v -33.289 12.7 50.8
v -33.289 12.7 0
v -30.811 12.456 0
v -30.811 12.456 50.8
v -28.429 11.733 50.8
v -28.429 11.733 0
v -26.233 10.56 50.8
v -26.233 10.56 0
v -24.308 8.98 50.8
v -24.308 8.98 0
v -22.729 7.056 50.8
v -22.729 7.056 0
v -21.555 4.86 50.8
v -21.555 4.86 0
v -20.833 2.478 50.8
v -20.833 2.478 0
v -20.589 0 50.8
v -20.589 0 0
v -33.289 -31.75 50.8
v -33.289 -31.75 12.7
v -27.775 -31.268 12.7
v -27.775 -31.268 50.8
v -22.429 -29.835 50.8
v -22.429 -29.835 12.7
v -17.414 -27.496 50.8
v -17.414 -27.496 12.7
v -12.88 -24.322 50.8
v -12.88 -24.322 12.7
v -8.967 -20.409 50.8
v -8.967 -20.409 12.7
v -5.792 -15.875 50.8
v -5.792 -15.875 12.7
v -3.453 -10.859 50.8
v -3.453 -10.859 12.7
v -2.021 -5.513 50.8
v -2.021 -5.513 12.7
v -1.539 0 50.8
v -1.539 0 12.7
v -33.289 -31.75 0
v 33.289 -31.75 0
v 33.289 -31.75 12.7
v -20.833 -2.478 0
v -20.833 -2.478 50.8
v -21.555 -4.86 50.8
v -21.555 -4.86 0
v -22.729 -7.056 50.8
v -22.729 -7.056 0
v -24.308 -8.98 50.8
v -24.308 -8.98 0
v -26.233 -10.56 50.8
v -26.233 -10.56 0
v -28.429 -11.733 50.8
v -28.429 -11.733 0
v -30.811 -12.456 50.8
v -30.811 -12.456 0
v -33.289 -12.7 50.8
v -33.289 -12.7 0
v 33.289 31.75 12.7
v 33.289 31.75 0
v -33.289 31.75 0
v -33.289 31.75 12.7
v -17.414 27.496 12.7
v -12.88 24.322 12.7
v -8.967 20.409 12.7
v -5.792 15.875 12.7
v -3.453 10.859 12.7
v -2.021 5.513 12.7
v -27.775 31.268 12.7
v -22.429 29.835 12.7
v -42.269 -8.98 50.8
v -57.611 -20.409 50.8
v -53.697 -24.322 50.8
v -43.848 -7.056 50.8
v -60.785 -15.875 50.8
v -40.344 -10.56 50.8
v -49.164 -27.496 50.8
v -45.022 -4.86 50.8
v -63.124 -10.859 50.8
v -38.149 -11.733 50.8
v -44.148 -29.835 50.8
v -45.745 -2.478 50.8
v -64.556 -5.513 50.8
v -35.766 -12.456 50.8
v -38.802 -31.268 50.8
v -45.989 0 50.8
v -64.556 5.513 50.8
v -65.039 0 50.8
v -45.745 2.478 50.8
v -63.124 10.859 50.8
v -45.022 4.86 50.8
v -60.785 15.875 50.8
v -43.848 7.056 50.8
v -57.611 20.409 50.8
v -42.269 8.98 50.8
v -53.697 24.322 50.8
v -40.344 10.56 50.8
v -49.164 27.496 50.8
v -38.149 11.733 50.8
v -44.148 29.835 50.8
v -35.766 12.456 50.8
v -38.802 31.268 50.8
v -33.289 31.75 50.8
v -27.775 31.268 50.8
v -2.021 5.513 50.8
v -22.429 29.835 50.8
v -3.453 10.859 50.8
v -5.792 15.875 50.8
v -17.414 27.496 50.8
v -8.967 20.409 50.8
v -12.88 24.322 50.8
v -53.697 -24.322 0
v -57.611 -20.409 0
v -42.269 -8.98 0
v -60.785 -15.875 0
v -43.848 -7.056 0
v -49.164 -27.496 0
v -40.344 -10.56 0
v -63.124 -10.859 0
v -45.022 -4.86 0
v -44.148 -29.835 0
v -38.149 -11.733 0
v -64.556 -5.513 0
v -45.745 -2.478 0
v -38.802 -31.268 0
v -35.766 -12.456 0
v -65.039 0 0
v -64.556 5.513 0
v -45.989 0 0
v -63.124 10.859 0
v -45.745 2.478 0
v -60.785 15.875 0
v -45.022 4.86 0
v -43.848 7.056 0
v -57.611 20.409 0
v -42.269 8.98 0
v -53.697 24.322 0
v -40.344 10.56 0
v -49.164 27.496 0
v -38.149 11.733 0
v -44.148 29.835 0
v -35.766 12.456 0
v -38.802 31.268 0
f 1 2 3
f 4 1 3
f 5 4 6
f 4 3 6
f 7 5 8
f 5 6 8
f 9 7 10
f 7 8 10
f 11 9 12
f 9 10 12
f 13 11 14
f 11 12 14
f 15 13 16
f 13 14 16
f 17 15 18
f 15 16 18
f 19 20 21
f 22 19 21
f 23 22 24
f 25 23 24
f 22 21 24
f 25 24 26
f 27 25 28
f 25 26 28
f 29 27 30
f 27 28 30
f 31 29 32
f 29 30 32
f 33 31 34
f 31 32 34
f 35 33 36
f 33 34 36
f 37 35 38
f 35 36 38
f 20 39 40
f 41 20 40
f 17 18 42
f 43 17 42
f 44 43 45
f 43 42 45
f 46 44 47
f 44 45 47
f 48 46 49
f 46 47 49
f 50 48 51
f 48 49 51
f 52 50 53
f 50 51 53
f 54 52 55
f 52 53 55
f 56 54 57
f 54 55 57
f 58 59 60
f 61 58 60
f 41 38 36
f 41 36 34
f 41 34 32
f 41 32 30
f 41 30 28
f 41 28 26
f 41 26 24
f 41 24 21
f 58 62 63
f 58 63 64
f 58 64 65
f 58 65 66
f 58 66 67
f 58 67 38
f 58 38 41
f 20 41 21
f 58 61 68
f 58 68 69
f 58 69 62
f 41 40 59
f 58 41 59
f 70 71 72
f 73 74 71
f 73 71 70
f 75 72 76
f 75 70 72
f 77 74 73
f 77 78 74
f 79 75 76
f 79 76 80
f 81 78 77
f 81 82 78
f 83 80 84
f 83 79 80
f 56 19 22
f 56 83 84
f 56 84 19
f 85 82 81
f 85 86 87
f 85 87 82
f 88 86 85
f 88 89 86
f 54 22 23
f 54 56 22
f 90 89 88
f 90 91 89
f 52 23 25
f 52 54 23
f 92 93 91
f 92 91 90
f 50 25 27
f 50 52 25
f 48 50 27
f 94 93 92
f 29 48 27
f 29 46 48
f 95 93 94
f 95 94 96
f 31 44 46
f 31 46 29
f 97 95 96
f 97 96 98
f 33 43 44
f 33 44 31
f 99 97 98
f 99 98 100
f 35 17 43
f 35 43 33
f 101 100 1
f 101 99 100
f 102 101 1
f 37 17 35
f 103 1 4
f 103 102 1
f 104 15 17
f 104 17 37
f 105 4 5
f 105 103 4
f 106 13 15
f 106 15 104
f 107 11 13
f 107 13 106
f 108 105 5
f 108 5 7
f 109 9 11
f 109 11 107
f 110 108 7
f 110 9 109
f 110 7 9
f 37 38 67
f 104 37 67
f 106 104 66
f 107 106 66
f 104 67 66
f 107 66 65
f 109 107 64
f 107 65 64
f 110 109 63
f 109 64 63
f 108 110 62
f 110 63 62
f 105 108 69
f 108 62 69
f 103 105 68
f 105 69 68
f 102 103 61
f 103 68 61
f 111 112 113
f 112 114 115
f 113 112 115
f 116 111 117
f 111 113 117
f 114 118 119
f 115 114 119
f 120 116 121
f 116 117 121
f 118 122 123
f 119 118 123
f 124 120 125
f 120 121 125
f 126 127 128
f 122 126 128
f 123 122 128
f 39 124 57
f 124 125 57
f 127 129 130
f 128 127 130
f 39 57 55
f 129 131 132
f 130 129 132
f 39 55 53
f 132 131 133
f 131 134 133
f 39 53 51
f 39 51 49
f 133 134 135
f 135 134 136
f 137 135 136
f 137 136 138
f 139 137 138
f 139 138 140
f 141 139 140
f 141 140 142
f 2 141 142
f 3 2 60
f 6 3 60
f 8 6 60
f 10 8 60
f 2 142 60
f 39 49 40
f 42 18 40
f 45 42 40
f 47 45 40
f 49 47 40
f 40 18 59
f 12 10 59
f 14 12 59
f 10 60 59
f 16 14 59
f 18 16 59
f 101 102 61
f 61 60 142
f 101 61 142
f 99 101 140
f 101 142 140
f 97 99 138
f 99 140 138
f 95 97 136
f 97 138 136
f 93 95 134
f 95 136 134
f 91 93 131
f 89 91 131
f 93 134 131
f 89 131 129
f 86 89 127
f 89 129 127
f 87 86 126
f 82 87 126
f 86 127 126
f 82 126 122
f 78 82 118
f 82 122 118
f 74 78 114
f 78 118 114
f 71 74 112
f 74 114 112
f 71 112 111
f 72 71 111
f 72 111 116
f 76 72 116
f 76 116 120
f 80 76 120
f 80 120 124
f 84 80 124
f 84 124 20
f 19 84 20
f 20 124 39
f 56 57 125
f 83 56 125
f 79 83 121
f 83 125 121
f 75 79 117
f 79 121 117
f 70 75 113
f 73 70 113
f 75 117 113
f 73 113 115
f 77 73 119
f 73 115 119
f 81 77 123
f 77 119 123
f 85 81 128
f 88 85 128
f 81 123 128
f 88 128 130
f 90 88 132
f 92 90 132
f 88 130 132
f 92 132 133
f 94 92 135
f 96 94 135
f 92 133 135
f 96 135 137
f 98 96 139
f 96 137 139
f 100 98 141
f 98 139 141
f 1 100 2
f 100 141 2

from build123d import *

# Parameters (mm, degrees)
F1_DEPTH = 12.7
F2_DEPTH = 50.8


with BuildPart() as f1:
    # F0 (on Top) → F1 (new body)
    with BuildSketch(Plane.XY):
        with BuildLine():
            ThreePointArc((-1.538598, 0), (-10.837958, -22.45064), (-33.288598, -31.75))
            Line((-33.288598, -31.75), (33.288598, -31.75))
            Line((33.288598, -31.75), (33.288598, 31.75))
            Line((33.288598, 31.75), (-33.288598, 31.75))
            ThreePointArc((-33.288598, 31.75), (-10.837958, 22.45064), (-1.538598, 0))
        make_face()
        with BuildLine():
            ThreePointArc((-33.288598, 31.75), (-65.038598, 0), (-33.288598, -31.75))
            Line((-33.288598, -31.75), (-33.288598, -12.7))
            ThreePointArc((-33.288598, -12.7), (-45.988598, 0), (-33.288598, 12.7))
            Line((-33.288598, 12.7), (-33.288598, 31.75))
        make_face()
    extrude(amount=F1_DEPTH)

    # F0 (on Top) → F2 (join)
    with BuildSketch(Plane.XY):
        with BuildLine():
            Line((-33.288598, -12.7), (-33.288598, -31.75))
            ThreePointArc((-33.288598, -31.75), (-10.837958, -22.45064), (-1.538598, 0))
            ThreePointArc((-1.538598, 0), (-10.837958, 22.45064), (-33.288598, 31.75))
            Line((-33.288598, 31.75), (-33.288598, 12.7))
            ThreePointArc((-33.288598, 12.7), (-24.308342, 8.980256), (-20.588598, 0))
            ThreePointArc((-20.588598, 0), (-24.308342, -8.980256), (-33.288598, -12.7))
        make_face()
        with BuildLine():
            ThreePointArc((-33.288598, 31.75), (-65.038598, 0), (-33.288598, -31.75))
            Line((-33.288598, -31.75), (-33.288598, -12.7))
            ThreePointArc((-33.288598, -12.7), (-45.988598, 0), (-33.288598, 12.7))
            Line((-33.288598, 12.7), (-33.288598, 31.75))
        make_face()
    extrude(amount=F2_DEPTH)


solid = f1.part
